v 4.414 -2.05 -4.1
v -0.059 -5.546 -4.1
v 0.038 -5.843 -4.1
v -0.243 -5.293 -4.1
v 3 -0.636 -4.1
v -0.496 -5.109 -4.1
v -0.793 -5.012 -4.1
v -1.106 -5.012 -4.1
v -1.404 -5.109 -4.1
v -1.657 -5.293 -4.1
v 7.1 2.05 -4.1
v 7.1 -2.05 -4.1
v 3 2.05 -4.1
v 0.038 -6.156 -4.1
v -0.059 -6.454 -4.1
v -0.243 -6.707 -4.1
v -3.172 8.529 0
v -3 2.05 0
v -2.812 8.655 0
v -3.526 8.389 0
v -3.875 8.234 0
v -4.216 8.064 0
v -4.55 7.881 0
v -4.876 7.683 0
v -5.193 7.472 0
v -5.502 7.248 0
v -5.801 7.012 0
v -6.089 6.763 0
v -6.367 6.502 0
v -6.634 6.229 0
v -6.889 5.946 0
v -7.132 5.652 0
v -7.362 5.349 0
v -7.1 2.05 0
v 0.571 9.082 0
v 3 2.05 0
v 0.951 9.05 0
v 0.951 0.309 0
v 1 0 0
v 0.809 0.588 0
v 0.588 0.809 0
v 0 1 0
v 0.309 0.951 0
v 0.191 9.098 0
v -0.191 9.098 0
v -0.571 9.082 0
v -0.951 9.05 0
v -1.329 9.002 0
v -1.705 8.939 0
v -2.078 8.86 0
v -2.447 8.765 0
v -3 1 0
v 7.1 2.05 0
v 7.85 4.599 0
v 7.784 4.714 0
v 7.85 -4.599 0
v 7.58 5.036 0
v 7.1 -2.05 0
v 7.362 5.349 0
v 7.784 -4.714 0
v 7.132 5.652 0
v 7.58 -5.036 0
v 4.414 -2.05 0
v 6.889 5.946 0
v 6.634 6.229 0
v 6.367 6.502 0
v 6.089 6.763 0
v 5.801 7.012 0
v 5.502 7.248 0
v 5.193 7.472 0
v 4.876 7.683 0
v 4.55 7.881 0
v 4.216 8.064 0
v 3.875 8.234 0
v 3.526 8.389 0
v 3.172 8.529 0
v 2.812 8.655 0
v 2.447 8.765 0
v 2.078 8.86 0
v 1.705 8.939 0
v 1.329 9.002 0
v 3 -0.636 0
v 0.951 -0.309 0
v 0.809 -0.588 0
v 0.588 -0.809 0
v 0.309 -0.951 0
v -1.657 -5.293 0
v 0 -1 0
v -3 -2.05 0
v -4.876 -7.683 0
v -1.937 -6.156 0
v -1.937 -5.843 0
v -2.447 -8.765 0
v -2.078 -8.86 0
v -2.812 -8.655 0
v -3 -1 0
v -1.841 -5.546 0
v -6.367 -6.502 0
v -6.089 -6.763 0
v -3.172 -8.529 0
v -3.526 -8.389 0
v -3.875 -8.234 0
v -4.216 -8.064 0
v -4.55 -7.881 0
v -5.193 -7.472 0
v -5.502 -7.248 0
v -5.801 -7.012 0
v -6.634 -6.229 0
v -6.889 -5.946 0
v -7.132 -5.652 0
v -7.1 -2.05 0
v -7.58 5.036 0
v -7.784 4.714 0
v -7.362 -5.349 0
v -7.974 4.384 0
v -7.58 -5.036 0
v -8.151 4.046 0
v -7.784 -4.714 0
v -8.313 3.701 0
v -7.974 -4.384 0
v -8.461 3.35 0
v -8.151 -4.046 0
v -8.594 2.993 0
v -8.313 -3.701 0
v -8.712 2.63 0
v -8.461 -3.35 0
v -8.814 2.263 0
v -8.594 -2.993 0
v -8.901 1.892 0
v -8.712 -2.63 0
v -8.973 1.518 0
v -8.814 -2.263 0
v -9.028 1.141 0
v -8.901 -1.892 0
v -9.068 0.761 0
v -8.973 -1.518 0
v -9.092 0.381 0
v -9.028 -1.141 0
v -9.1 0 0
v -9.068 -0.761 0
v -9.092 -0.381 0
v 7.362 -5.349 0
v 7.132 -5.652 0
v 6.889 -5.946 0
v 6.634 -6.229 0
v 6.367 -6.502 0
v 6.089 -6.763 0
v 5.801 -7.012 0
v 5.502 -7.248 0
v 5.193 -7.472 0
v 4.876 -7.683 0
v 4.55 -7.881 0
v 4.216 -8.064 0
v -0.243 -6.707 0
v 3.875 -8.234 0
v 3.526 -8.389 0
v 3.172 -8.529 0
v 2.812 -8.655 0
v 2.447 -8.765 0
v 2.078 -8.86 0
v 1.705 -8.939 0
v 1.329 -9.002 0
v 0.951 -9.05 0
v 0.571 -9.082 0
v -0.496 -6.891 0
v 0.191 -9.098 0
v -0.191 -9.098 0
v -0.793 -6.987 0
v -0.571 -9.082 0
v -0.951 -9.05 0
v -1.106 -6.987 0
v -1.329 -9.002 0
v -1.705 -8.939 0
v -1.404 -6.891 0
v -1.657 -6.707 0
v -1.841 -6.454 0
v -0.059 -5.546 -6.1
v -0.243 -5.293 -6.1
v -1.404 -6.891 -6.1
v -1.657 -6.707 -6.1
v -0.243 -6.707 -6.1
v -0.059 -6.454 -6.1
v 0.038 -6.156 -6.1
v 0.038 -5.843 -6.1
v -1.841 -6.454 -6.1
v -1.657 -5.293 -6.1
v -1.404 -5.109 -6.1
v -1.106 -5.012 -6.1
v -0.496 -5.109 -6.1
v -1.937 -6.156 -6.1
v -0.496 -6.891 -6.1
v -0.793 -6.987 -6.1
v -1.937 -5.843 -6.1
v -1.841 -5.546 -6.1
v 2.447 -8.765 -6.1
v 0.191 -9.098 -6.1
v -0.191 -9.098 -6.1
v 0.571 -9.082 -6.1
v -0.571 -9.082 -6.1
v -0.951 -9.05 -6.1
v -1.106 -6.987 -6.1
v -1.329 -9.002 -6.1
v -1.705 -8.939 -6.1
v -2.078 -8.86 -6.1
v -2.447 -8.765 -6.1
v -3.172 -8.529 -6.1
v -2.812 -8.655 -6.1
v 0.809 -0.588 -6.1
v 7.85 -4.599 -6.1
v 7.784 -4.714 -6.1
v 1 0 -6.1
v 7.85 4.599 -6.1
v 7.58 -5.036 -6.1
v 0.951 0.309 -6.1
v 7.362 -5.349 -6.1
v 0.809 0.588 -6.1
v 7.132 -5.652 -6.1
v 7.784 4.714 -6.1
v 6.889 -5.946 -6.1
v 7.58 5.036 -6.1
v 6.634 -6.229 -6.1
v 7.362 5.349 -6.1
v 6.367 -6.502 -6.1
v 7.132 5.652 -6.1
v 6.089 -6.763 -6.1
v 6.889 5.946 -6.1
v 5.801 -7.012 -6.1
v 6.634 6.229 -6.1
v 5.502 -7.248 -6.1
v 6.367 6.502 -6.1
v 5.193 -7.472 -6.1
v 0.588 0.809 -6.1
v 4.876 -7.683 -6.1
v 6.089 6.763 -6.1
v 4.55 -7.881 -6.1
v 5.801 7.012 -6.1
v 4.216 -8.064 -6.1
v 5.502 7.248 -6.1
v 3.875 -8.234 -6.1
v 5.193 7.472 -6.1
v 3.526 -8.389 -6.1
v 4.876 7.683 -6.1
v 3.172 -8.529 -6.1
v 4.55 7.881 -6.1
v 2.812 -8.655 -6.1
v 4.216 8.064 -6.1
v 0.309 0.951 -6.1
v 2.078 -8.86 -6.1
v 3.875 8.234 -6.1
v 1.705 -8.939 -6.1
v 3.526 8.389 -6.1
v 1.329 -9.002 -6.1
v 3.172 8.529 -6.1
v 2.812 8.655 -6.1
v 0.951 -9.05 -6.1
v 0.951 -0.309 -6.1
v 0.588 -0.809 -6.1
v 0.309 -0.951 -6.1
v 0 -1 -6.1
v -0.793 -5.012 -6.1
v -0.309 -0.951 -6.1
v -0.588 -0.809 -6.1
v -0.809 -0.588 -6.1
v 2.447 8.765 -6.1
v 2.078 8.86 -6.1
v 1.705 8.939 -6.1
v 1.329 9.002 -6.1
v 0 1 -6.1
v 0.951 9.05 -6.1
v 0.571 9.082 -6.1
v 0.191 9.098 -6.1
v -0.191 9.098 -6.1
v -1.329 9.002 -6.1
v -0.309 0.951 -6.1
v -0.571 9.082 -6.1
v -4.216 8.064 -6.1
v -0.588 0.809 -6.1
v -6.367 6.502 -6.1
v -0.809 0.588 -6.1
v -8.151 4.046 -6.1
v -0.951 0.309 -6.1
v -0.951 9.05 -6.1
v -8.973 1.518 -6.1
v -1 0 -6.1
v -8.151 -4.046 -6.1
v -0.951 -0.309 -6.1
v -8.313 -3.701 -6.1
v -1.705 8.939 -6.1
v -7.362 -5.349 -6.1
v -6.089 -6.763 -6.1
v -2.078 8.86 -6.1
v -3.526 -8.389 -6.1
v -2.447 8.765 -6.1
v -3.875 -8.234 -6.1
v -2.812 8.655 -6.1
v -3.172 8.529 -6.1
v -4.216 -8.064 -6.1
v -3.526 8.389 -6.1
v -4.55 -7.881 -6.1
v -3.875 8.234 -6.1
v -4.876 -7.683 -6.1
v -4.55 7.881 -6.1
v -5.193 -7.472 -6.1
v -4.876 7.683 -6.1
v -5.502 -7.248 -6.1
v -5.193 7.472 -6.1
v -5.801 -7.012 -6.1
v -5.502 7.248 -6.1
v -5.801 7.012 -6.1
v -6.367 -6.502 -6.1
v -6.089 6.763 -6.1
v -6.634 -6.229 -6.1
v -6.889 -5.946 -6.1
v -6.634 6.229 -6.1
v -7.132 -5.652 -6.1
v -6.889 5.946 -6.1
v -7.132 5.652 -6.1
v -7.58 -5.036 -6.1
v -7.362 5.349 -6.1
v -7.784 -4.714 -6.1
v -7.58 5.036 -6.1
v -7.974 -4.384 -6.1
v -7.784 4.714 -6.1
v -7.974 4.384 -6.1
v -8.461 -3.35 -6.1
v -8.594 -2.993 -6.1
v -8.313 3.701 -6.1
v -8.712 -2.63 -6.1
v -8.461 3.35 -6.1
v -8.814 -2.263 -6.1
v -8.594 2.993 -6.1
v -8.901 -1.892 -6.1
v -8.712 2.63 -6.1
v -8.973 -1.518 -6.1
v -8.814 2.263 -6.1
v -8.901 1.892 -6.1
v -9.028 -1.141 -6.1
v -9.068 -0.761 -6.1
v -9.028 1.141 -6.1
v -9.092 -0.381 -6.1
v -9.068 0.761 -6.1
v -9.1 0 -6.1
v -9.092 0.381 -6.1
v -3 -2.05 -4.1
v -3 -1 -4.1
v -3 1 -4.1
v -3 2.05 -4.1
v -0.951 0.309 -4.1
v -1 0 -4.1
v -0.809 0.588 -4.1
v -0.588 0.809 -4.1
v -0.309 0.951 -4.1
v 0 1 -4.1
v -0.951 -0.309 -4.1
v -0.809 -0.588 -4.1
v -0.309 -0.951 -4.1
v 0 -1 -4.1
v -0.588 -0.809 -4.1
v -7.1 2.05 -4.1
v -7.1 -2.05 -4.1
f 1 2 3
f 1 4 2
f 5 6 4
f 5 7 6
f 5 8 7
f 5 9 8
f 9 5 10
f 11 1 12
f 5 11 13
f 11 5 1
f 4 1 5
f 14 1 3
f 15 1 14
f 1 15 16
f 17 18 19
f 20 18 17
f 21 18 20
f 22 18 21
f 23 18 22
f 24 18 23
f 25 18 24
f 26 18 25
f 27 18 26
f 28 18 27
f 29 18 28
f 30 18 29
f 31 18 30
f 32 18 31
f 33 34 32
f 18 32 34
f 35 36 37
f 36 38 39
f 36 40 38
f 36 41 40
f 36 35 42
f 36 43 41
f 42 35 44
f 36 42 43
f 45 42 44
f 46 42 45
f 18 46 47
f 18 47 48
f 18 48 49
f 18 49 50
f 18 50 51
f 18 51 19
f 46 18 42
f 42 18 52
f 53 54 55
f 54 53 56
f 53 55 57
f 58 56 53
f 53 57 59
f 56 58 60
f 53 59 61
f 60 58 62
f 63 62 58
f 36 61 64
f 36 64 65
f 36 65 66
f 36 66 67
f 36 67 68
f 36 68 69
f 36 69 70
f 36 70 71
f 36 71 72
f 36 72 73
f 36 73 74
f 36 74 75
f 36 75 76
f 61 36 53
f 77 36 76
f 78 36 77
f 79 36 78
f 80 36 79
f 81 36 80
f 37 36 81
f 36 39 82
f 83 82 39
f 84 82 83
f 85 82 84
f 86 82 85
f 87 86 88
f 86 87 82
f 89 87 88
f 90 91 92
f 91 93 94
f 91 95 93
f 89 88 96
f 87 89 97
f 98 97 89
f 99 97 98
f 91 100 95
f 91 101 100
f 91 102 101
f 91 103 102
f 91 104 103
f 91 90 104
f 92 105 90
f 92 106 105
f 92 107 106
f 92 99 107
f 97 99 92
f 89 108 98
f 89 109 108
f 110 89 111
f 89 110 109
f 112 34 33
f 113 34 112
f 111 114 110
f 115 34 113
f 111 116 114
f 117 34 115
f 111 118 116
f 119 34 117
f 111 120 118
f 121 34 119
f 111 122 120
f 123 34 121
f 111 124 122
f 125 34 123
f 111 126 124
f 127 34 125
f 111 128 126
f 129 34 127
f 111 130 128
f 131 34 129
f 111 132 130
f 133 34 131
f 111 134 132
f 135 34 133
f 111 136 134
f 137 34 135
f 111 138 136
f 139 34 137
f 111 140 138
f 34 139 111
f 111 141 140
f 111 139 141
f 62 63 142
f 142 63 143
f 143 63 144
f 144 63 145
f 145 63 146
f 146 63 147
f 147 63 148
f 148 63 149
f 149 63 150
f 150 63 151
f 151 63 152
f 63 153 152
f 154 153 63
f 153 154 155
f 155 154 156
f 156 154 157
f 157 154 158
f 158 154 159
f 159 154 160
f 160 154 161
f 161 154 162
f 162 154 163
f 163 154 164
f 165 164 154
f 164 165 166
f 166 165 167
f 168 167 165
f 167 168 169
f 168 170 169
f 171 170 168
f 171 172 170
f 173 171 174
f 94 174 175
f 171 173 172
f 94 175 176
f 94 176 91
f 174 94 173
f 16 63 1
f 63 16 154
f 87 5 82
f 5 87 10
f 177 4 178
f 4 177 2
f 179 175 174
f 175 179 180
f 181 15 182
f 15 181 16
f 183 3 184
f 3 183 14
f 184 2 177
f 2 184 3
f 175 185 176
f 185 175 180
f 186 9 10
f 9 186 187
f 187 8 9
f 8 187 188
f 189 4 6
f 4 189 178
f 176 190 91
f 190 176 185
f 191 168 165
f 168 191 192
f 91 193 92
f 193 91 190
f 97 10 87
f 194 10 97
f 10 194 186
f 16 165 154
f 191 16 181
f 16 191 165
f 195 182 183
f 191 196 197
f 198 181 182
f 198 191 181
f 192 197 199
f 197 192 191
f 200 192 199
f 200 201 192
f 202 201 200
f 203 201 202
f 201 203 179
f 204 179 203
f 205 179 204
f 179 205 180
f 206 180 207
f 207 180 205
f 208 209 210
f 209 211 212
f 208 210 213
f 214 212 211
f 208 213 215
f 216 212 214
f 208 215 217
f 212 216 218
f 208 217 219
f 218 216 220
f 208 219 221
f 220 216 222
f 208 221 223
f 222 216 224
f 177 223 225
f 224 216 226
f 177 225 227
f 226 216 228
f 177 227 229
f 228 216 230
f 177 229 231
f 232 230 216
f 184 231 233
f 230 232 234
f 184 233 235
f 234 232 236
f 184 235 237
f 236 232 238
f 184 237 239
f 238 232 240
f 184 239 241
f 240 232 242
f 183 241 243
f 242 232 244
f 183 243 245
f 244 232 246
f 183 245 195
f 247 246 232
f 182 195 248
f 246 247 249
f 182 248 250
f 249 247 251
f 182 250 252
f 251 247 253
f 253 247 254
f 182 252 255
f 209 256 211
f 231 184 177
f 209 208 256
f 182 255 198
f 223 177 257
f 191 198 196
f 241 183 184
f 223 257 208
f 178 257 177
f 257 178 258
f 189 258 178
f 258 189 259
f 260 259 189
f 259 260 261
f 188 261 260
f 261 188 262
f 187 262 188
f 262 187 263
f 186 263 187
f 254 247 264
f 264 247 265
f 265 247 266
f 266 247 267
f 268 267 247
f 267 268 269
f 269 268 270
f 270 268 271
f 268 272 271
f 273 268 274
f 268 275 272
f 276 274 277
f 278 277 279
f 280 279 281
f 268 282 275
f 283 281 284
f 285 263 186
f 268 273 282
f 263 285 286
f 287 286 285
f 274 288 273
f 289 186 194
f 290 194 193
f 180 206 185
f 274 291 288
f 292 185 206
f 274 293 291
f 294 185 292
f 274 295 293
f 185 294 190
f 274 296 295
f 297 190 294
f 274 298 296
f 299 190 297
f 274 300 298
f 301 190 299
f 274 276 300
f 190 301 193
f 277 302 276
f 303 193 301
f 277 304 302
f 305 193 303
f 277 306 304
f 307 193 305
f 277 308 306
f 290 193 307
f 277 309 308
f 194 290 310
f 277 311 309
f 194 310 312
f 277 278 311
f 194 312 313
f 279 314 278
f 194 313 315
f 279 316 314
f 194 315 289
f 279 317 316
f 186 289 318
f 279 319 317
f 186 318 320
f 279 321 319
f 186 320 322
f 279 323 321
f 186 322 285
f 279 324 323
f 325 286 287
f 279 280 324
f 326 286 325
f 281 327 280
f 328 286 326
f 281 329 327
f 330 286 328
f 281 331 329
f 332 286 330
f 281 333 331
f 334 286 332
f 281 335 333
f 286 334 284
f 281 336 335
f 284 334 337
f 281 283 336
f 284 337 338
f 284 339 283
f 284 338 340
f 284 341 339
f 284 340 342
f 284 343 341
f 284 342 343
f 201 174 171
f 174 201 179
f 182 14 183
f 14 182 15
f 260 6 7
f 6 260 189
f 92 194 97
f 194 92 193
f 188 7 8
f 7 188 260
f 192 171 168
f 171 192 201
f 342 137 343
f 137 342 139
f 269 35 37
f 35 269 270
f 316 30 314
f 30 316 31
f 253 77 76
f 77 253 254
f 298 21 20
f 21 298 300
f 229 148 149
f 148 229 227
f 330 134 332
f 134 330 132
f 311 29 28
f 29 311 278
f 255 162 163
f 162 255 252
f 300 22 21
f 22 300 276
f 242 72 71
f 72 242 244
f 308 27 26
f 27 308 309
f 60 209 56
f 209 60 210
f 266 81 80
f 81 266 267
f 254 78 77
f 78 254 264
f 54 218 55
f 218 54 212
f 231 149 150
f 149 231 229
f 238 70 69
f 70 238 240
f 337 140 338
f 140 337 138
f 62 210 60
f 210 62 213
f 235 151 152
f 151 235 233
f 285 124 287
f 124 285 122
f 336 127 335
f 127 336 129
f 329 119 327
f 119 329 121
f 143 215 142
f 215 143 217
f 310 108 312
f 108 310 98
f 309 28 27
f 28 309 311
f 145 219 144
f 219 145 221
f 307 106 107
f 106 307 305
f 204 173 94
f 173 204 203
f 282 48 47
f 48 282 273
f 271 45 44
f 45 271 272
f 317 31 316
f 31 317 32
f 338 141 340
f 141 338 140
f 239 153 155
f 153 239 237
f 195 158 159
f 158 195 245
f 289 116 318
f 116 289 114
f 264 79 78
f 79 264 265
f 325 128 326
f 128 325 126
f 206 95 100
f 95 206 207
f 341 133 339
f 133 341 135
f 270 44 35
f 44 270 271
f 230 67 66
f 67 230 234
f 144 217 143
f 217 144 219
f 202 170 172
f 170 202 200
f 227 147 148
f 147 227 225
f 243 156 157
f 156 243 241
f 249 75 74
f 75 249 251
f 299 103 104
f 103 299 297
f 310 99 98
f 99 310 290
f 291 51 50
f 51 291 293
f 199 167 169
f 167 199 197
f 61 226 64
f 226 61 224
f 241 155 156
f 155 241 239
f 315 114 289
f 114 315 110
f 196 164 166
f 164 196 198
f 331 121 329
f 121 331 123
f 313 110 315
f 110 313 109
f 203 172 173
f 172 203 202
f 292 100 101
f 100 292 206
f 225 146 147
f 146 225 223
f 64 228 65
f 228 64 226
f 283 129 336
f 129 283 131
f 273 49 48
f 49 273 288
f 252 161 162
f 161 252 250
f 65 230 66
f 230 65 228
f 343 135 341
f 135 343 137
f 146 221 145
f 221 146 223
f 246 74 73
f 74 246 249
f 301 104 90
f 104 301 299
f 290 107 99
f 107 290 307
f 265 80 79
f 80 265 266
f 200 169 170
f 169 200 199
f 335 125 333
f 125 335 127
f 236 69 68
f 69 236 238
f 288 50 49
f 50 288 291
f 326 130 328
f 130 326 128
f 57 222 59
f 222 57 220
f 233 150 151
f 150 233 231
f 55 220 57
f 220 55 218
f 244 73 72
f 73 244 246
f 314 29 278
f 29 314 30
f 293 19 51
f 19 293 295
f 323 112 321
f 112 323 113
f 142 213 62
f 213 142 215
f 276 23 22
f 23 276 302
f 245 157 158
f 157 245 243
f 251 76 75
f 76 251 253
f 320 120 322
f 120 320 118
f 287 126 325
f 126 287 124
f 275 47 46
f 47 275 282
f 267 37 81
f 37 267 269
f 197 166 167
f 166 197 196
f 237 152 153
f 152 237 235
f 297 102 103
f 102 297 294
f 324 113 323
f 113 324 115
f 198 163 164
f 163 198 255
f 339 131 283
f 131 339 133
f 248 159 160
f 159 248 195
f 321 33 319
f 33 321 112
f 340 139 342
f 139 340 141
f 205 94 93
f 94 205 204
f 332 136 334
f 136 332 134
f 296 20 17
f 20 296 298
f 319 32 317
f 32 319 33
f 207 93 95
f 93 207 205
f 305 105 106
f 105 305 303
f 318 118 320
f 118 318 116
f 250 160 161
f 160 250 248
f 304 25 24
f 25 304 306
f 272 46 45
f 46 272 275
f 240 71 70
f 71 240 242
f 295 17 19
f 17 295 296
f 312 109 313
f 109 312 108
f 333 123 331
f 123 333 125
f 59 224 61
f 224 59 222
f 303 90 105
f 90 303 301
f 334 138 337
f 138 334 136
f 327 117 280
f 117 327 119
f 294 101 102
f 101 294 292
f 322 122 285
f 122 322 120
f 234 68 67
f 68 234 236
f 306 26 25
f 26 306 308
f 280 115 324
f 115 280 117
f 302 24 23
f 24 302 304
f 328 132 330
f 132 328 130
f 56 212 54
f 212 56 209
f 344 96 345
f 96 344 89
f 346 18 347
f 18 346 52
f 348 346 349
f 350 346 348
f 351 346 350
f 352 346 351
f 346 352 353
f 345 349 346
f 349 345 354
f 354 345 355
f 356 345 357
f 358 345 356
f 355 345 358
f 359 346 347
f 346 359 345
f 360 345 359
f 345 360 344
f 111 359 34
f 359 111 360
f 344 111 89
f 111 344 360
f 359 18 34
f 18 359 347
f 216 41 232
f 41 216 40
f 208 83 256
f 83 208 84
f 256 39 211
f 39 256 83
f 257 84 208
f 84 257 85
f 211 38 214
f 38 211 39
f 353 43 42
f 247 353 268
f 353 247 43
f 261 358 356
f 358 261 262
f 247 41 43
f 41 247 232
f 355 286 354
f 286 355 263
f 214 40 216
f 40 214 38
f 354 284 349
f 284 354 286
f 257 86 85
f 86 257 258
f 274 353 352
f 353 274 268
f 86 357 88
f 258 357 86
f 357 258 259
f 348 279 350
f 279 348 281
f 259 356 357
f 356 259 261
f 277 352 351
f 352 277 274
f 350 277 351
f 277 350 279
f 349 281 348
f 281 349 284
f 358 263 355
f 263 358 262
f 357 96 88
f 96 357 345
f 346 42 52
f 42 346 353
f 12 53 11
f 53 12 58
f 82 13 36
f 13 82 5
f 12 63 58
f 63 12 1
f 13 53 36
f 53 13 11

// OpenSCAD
/*
 * A holder to make miniature spotlights out of LEDs.
 *
 * This uses two square magnets to make contact with a power supply. The magnets
 * connect to a resistor (on the - side) and a wire on the + side. There are
 * two holes that go through the holder to the LED itself.
 *
 * All units here are in mm.
 */

// Size of the magnets (mm).
magnet_size=4.1;

// Distance from the center of the holder to the edge of the magnets.
center_offset=3;

// Diameter of the center hole.
center_hole=2;

// Height of the housing above the magnet.
height_above_magnets=2;

// Distance from the edge of the magnet to the edge of the housing.
magnet_to_wall=2;

// Size of the polarity keying. This is a notch cut out of the body, marking
// the cathode (-). This is the same as the flat spot on LEDs.
key_size=1.25;

// Length of the resistor channel (this is the length of your resistor, plus a
// little wiggle room for the leads).
resistor_x=7;

// Width of the resistor channel (this is the width of your resistor).
resistor_y=2;

// Size of the hole for the resistor. This should probably be the same as the
// center_hole.
resistor_hole=2;

/////////////////////////////////////////////////////////////////////

resistor_z=magnet_size;

top_h=height_above_magnets;

body_radius = magnet_size + center_offset + magnet_to_wall;
body_height=magnet_size+top_h;

/*
 * Rotate the body to make it printable on an extrusion printer.
 */
rotate([-180,0,0]){
	magnet_holder();
}

/*
 * The body of the holder.
 */
module magnet_holder(){
	difference(){
		// The main body of the holder.
		cylinder(h=body_height,r=body_radius,$fn=150);

		// Polarity key (this marks the cathode).
		translate([body_radius - key_size,-body_radius,0])
			cube([key_size, body_radius*2, body_height]);

		// Left magnet (anode, positive).
		translate([-magnet_size/2-center_offset,0,magnet_size/2]){
			magnet();
		}
		// Hole in the center for the cathode.
		cylinder(h=magnet_size+top_h,r=center_hole/2,$fn=20);

		// Channel to pass wire from the magnet to the center hole.
		translate([-4,-center_hole/2,0])
			cube([4,center_hole,magnet_size]);

		// Right magnet (cathode, negative).
		translate([magnet_size/2+center_offset,0,magnet_size/2]){
			magnet();
		}

		// Hole for resistor connected to the cathode.
		translate([center_offset+resistor_y/2,magnet_size/2-resistor_y/2,0]){
			rotate([0,0,-45]){
				translate([-resistor_x,-resistor_y/2,0]){
						cube([resistor_x,resistor_y,resistor_z]);

					// Hole for wire on other side of resistor.
					translate([0,resistor_y/2,0]){
						cylinder(h=magnet_size+top_h,r=resistor_hole/2,$fn=20);
					}
				}
			}
		}
	}
}

/*
 * An individual square magnet cavity.
 */
module magnet(){
	cube([magnet_size,magnet_size,magnet_size],center=true);
}
